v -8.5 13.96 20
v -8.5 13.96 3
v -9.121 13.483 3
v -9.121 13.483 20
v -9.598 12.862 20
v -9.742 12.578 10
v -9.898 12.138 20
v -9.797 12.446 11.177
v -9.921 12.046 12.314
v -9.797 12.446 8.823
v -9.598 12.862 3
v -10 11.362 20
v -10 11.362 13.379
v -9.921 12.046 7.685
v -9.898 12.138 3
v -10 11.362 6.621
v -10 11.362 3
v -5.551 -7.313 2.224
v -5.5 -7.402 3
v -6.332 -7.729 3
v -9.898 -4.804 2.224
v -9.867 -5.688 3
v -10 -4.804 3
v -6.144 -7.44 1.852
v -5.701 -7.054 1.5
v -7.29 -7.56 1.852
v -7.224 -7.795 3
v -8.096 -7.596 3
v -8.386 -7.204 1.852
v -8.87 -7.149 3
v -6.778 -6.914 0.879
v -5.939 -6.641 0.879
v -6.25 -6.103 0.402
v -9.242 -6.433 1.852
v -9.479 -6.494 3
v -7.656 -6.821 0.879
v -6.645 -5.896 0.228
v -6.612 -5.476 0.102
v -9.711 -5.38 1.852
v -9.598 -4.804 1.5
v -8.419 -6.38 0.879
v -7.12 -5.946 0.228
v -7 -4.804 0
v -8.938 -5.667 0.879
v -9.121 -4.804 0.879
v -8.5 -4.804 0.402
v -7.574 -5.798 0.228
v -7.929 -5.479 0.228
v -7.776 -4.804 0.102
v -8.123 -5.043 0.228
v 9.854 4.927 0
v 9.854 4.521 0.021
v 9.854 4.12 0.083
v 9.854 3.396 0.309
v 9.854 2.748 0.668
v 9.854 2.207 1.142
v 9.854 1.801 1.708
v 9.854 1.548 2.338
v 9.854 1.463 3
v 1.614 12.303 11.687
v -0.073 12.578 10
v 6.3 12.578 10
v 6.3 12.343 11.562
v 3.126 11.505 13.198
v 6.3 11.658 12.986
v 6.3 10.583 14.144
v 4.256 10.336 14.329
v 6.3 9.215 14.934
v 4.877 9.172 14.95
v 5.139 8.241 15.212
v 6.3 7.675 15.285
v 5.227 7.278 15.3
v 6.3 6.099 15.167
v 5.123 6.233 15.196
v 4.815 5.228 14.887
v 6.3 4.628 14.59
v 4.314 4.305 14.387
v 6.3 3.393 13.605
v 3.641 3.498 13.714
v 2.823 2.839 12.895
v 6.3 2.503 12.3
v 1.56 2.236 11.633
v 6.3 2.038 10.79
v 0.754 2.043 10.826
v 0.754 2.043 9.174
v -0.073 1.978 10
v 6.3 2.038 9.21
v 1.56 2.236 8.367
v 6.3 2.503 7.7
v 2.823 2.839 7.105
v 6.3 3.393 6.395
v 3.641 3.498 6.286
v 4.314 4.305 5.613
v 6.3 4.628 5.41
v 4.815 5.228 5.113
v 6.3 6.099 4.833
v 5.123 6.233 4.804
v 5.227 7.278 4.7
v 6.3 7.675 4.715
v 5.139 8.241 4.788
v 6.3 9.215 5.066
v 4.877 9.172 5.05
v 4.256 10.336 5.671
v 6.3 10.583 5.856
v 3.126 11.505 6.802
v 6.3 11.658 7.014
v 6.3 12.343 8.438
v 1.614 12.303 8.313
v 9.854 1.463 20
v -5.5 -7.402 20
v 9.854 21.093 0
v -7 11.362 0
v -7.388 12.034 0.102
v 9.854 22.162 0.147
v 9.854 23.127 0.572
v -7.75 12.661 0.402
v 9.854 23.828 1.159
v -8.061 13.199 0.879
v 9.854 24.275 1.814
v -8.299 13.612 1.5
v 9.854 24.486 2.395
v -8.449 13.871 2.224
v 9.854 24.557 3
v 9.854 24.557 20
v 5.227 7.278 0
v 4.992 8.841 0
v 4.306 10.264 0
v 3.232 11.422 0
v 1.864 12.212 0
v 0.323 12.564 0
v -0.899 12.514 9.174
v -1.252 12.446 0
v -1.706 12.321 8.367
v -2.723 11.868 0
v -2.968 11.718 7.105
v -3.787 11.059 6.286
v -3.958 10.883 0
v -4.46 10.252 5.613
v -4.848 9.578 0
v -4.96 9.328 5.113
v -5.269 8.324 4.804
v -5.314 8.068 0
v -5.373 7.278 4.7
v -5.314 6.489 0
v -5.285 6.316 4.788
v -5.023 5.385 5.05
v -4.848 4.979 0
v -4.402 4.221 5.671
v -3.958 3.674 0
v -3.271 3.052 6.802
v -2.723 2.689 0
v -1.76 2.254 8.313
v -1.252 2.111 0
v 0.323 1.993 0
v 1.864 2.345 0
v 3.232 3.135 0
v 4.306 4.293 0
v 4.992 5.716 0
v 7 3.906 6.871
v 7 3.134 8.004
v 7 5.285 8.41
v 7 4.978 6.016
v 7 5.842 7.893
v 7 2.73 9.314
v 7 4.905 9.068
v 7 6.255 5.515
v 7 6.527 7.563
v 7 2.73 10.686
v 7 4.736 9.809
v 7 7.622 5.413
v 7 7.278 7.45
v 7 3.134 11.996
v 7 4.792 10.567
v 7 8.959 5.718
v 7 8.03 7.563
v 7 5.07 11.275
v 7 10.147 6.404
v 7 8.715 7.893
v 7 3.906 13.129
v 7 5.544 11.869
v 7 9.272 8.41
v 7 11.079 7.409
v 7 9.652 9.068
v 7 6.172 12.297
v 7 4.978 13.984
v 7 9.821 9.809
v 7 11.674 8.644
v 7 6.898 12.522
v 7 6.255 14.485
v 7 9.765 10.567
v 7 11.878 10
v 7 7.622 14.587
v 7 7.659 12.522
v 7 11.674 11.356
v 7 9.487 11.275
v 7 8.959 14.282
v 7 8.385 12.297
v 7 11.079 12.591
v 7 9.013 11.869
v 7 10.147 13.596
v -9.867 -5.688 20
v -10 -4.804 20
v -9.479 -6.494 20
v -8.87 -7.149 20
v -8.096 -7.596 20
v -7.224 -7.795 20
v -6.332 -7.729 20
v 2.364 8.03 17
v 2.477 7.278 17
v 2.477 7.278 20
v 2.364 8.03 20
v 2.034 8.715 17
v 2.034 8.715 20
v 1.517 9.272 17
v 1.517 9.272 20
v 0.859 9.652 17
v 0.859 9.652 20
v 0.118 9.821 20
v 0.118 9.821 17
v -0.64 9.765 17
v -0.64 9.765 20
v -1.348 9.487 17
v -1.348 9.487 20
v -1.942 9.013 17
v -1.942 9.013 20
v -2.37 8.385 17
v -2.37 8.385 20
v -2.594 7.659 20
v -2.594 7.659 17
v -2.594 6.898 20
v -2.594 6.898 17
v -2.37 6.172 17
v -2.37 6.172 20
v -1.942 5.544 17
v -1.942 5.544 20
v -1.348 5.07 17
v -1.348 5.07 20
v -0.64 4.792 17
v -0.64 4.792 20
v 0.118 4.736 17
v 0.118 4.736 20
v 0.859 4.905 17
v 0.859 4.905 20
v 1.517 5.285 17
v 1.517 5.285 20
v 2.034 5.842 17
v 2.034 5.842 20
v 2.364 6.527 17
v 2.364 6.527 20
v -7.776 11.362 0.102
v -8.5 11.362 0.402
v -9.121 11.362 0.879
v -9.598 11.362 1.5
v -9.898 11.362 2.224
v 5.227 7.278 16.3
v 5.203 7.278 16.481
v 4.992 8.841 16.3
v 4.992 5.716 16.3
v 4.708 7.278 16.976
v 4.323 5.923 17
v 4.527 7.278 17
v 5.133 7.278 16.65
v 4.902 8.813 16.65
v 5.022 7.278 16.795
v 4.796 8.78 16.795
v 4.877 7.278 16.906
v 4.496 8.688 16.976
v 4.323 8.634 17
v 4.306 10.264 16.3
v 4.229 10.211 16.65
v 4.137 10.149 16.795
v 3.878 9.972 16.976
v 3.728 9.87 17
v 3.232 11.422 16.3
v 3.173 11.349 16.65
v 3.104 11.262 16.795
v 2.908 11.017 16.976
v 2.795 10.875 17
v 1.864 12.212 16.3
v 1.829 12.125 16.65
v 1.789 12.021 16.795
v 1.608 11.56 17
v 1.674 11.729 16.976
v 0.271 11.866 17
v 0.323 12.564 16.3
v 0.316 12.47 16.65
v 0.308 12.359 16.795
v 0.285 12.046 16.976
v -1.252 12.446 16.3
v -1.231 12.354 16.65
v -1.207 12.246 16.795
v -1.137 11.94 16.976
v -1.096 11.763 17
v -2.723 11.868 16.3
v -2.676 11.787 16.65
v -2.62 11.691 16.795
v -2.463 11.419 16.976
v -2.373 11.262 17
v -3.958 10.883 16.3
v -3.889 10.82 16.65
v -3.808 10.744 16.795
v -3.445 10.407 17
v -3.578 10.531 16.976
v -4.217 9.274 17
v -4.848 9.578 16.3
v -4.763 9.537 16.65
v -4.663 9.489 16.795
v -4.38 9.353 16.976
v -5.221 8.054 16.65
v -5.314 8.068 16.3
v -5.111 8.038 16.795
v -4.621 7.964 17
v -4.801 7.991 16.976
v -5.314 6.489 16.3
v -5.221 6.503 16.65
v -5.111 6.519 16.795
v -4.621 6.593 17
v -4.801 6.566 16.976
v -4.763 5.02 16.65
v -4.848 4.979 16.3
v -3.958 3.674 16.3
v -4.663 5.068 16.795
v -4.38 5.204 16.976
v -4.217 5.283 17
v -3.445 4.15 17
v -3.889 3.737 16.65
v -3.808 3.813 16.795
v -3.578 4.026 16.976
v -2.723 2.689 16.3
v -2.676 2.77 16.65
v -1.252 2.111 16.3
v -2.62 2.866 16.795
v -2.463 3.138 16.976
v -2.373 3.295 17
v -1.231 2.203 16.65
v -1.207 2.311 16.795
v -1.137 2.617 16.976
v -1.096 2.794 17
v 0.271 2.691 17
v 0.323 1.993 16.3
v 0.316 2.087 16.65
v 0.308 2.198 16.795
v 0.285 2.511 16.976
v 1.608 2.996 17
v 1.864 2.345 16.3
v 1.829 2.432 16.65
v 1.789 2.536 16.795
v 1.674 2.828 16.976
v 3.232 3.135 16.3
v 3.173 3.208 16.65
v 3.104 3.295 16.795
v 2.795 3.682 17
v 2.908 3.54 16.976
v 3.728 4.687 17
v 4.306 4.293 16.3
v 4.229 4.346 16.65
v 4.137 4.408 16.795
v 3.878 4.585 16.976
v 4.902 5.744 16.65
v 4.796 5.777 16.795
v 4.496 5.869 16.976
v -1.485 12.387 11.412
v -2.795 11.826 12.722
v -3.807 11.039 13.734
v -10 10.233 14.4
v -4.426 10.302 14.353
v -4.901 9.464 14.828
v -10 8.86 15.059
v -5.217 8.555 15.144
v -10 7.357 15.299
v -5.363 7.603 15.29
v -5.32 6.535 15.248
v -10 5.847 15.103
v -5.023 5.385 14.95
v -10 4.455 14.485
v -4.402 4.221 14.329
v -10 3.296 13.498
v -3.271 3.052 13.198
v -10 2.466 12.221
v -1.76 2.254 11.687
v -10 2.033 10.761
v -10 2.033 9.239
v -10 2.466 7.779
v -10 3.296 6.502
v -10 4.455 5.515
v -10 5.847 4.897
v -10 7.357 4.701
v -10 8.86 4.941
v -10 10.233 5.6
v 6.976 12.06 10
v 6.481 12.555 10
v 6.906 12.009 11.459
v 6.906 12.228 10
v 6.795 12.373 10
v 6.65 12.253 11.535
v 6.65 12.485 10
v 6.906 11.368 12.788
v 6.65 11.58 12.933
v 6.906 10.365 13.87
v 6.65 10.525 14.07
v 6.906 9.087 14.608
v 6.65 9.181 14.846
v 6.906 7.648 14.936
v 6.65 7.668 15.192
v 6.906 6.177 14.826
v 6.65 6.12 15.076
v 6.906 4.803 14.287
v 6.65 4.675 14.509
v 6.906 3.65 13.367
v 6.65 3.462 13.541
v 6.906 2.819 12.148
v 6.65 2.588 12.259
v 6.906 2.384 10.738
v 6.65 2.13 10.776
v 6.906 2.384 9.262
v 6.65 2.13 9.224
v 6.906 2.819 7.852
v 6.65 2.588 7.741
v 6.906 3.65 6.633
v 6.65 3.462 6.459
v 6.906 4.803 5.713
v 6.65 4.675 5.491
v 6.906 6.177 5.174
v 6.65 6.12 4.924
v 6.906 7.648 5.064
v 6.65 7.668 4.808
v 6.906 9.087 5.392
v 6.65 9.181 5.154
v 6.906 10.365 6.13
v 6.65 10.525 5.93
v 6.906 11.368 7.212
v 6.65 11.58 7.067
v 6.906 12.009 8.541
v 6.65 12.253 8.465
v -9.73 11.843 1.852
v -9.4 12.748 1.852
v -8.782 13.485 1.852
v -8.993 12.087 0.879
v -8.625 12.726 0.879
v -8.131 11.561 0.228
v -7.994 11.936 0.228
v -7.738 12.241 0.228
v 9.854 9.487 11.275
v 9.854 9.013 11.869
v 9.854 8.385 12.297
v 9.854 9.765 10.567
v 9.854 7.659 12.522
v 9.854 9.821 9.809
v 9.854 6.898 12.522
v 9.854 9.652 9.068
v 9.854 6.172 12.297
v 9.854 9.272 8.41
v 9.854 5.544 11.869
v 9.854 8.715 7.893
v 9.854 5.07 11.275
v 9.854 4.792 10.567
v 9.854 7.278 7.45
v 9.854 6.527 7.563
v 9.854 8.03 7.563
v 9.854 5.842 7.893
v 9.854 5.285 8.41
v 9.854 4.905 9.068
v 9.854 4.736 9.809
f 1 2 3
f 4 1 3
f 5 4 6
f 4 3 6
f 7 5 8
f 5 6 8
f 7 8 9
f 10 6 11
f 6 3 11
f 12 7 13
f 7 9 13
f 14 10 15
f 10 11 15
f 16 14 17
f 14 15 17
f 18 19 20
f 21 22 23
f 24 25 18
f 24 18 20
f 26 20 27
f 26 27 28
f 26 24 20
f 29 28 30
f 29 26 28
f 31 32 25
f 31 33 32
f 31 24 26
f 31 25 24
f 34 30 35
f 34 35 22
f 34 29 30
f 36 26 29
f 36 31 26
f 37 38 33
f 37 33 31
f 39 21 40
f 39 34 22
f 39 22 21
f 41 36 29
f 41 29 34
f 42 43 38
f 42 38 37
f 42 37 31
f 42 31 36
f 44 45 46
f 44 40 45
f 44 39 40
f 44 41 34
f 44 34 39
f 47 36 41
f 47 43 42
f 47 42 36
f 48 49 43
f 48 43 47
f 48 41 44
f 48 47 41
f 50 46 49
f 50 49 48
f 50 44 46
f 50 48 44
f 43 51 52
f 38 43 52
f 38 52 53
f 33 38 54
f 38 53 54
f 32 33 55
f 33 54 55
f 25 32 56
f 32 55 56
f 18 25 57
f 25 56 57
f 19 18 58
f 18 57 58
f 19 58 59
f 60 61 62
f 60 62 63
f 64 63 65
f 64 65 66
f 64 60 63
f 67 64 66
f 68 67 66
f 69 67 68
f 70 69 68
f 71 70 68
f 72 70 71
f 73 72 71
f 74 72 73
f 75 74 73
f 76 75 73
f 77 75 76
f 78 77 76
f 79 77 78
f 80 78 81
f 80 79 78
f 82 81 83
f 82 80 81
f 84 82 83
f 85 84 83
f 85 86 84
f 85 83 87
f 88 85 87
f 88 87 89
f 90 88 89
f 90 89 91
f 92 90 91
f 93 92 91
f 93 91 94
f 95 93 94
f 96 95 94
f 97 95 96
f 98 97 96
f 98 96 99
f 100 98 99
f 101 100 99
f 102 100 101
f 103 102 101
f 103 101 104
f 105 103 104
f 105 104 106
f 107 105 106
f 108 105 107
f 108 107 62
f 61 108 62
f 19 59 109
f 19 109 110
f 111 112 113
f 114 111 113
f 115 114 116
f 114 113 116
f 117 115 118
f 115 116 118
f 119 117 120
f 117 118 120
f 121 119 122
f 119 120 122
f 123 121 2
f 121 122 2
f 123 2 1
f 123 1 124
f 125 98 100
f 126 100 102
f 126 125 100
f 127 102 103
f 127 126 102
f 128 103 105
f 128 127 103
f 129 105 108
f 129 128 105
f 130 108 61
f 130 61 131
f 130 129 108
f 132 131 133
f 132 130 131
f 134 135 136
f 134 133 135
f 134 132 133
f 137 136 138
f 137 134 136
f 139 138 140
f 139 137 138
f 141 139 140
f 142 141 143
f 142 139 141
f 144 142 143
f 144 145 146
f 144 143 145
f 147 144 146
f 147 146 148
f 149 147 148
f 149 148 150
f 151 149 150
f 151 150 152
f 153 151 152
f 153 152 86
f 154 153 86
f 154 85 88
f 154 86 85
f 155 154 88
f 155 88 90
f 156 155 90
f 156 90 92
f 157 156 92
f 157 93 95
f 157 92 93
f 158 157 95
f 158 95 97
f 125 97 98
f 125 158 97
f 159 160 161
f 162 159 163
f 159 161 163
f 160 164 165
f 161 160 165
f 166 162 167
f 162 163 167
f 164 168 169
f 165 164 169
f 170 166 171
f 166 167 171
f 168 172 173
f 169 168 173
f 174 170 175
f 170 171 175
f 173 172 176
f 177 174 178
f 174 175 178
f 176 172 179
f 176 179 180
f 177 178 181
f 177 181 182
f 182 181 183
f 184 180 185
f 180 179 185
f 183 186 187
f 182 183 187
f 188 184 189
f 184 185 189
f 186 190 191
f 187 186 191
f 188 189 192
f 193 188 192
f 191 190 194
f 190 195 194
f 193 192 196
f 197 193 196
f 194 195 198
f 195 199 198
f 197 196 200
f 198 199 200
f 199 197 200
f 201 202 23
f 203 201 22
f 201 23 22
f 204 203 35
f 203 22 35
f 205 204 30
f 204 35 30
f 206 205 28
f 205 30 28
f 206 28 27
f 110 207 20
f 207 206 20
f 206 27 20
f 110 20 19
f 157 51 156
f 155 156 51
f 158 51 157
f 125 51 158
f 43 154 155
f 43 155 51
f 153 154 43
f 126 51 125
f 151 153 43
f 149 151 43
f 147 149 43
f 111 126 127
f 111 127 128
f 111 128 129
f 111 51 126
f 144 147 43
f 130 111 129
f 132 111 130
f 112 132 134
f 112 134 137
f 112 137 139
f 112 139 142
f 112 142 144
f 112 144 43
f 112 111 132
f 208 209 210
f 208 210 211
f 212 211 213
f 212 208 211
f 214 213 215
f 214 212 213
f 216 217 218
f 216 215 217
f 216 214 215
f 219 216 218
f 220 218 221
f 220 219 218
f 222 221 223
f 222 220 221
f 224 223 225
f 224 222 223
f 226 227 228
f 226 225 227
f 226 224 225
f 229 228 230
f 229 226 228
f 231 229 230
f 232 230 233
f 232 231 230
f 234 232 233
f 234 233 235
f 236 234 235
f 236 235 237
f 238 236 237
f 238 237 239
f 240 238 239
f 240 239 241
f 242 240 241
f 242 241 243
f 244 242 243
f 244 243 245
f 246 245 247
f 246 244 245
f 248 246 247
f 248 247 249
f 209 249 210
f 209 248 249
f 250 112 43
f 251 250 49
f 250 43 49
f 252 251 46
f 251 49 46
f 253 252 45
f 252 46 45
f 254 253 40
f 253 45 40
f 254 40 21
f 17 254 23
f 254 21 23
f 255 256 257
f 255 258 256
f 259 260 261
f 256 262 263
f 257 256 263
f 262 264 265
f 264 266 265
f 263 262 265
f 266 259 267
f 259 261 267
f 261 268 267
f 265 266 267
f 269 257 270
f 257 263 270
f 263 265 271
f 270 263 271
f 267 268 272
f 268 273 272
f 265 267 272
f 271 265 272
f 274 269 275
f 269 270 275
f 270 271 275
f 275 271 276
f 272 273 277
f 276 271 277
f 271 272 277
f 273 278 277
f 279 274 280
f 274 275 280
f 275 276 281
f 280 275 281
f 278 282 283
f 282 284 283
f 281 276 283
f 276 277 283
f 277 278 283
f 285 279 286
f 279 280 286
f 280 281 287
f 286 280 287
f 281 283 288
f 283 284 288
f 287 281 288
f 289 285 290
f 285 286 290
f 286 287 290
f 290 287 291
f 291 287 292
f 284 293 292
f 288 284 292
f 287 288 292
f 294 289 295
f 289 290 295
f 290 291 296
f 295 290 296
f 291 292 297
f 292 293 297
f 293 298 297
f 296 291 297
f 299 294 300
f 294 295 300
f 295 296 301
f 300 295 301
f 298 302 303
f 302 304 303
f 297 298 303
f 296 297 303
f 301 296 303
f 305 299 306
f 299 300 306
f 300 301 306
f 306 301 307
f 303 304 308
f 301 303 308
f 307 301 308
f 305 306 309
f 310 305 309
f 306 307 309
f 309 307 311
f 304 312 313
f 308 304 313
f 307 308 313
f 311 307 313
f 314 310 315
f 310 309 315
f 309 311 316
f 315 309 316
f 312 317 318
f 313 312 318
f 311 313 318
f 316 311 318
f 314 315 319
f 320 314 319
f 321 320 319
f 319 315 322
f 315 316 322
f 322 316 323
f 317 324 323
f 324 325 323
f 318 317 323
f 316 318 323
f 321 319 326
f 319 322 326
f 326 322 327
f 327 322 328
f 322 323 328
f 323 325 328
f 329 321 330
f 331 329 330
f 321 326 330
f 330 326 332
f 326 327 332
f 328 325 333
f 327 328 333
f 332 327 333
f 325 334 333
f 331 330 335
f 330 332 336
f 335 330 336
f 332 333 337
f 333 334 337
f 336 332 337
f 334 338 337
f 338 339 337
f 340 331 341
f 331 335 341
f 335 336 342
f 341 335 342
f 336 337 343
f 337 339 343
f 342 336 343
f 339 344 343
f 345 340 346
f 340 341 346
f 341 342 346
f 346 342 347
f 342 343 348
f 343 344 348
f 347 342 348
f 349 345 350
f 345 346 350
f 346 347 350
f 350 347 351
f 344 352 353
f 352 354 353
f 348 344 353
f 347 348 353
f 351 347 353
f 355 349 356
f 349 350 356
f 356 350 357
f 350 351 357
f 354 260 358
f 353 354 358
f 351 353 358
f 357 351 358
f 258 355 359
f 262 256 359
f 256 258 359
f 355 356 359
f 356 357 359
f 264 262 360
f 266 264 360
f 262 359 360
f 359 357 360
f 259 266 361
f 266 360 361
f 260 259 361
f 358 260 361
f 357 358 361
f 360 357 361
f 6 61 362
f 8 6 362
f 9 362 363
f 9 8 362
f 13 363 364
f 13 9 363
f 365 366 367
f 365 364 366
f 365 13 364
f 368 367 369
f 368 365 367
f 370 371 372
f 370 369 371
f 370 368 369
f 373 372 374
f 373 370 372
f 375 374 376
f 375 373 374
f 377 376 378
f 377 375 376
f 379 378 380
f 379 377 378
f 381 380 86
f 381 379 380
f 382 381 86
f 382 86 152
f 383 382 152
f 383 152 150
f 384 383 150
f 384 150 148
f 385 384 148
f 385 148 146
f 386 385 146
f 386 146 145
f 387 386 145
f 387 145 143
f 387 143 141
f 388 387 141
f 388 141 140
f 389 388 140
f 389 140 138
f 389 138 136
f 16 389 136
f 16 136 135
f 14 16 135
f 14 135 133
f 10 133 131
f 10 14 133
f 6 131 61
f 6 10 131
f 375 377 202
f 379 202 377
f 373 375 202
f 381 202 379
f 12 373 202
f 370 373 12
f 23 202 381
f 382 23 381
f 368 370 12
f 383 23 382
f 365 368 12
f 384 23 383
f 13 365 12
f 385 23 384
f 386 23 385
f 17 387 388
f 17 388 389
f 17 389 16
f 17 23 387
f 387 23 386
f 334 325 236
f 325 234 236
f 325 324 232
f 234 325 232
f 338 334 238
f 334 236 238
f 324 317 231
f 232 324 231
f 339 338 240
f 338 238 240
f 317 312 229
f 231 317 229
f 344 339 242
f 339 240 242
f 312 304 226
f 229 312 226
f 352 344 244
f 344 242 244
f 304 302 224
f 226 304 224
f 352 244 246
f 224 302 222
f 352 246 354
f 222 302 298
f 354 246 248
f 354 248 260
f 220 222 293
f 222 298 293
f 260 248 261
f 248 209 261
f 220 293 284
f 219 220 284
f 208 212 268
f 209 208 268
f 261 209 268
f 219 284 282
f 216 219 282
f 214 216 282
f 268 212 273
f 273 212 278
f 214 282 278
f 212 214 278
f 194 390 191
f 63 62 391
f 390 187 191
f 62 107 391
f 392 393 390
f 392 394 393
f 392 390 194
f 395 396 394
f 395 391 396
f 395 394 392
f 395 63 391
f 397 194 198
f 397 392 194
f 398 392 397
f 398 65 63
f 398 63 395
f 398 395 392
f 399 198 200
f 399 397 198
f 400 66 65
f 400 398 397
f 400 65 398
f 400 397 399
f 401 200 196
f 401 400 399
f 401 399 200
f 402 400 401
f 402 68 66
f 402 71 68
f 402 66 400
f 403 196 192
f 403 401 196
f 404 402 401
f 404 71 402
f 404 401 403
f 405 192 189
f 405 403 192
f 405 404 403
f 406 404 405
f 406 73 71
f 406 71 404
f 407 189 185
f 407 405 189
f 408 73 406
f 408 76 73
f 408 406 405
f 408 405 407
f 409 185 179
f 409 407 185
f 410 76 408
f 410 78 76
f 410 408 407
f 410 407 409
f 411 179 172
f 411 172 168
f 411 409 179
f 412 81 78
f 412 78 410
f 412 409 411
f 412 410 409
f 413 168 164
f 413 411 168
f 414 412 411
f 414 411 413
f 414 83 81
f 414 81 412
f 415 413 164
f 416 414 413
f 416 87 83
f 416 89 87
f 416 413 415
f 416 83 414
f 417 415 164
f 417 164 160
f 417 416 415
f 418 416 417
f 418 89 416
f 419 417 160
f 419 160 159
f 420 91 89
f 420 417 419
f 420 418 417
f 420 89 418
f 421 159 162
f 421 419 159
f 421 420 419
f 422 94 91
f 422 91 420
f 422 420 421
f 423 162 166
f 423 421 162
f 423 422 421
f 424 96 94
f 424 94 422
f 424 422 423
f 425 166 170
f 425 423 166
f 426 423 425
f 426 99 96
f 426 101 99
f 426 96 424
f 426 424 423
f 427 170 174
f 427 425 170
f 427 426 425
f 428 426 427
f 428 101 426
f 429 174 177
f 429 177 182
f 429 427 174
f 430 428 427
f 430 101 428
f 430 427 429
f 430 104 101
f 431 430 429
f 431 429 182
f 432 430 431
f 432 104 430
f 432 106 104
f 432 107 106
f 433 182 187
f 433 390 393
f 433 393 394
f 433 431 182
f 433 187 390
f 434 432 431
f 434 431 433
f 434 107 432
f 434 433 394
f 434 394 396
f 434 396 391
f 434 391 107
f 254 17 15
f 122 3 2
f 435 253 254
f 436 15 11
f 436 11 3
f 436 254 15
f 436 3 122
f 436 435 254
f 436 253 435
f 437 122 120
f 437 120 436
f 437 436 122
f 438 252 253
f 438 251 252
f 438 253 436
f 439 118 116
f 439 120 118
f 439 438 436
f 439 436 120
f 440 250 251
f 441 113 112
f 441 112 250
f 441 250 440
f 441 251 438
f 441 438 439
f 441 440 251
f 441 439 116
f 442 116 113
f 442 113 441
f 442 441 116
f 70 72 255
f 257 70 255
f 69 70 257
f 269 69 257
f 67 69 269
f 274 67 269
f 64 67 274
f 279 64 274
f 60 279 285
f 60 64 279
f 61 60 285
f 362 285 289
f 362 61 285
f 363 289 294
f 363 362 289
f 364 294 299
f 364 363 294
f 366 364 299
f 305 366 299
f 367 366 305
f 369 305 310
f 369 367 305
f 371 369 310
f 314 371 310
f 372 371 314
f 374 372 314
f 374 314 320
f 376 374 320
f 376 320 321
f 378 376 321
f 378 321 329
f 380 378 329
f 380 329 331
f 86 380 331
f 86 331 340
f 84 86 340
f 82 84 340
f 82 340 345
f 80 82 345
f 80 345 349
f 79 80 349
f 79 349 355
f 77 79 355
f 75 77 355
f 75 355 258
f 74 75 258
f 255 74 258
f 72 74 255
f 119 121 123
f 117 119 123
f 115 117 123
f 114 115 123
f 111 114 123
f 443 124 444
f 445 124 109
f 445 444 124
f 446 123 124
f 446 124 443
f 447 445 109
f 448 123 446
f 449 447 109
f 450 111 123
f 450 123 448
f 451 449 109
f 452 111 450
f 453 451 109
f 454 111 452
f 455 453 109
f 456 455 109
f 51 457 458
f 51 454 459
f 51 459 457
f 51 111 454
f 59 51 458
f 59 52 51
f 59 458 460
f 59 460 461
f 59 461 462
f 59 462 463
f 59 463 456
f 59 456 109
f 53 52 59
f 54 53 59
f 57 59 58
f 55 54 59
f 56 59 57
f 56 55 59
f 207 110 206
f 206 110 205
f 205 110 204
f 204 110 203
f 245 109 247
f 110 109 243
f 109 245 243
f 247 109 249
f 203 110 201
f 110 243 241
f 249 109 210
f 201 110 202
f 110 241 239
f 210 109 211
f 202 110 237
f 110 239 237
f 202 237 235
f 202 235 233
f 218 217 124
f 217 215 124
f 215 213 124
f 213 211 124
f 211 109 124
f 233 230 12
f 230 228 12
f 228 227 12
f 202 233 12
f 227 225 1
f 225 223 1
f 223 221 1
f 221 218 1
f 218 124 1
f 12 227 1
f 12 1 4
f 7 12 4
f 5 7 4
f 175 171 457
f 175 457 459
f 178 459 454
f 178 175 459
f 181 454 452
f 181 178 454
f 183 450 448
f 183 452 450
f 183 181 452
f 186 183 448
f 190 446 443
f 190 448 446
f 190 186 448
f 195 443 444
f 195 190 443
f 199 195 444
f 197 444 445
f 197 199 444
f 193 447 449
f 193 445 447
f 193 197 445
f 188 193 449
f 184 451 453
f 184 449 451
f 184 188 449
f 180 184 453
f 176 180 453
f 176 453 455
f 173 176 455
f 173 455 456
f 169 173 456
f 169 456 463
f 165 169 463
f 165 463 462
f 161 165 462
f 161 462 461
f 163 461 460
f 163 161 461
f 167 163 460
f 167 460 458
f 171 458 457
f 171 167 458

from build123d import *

# Parameters (mm, degrees)
BOSS_EXTRUDE1_DEPTH     = 20
SKETCH4_R               = 2.55
CUT_EXTRUDE2_DEPTH      = 34.212108316
CUT_EXTRUDE3_DEPTH      = 34.212108316
CUT_EXTRUDE3_DEPTH_BACK = 34.212108316
SKETCH5_R               = 2.55
SKETCH6_R               = 5.3
CUT_EXTRUDE4_DEPTH      = 17
CUT_EXTRUDE5_DEPTH      = 7
CUT_EXTRUDE5_DEPTH_BACK = 10
SKETCH7_R               = 5.3
FILLET1_R               = 0.7
FILLET2_R               = 3


with BuildPart() as part:
    # Sketch1 → Boss-Extrude1 (new body)
    with BuildSketch(Plane.XY):
        Polygon((-10, 13.094), (9.854423989, 24.556957035), (9.854423989, 1.462957035), (-10, -10), align=None)
    extrude(amount=BOSS_EXTRUDE1_DEPTH)

    # Sketch4 → Cut-Extrude2 (cut, through all)
    with BuildSketch(Plane.XY):
        with Locations((-0.072788005, 7.278478517)):
            Circle(SKETCH4_R)
    extrude(amount=CUT_EXTRUDE2_DEPTH, mode=Mode.SUBTRACT)

    # Sketch5 → Cut-Extrude3 (cut, two sides: drawn at the far end of the back side and taken through both)
    with BuildSketch(Plane(origin=(0, 0, 0), x_dir=(0, 0, -1), z_dir=(1, 0, 0)).offset(-CUT_EXTRUDE3_DEPTH_BACK)):
        with Locations((-10, 7.278478517)):
            Circle(SKETCH5_R)
    extrude(amount=CUT_EXTRUDE3_DEPTH + CUT_EXTRUDE3_DEPTH_BACK, mode=Mode.SUBTRACT)

    # Sketch6 → Cut-Extrude4 (cut)
    with BuildSketch(Plane.XY):
        with Locations((-0.072788005, 7.278478517)):
            Circle(SKETCH6_R)
    extrude(amount=CUT_EXTRUDE4_DEPTH, mode=Mode.SUBTRACT)

    # Sketch7 → Cut-Extrude5 (cut, two sides: drawn at the far end of the back side and taken through both)
    with BuildSketch(Plane(origin=(0, 0, 0), x_dir=(0, 0, -1), z_dir=(1, 0, 0)).offset(-CUT_EXTRUDE5_DEPTH_BACK)):
        with Locations(Location((-10, 7.278478517, 0), (0, 0, 90))):
            Circle(SKETCH7_R)
    extrude(amount=CUT_EXTRUDE5_DEPTH + CUT_EXTRUDE5_DEPTH_BACK, mode=Mode.SUBTRACT)

    # Fillet1
    fillet1_edges = [part.edges().sort_by_distance(p)[0] for p in [
        (-5.372788005, 7.278478517, 17),
        (7, 1.978478517, 10),
    ]]
    fillet(fillet1_edges, radius=FILLET1_R)

    # Fillet2
    # the kernel refuses this fillet: 3 mm, written as the material it takes off along each edge
    with BuildSketch(Plane(origin=(-7, -4.803847577, 3), x_dir=(-1, 0, 0), z_dir=(0, 0, -1))) as fillet2_piece_1_section:
        Polygon((0, 0), (FILLET2_R, 0), (FILLET2_R, -FILLET2_R * 1.73205080757), (-FILLET2_R * 0.5, -FILLET2_R * 0.866025403784), align=None)
    fillet2_piece_1 = extrude(amount=FILLET2_R, mode=Mode.PRIVATE)
    fillet2_piece_1 = fillet2_piece_1 - Plane(origin=(-7, -4.803847577, 3), x_dir=(0.49999999999999906, 0.8660254037844392, 0), z_dir=(0, 0, -1)) * Sphere(FILLET2_R, mode=Mode.PRIVATE)
    add(fillet2_piece_1, mode=Mode.SUBTRACT)
    with BuildSketch(Plane(origin=(-7, 11.361949192, 3), x_dir=(-0.5000000000000018, 0.8660254037844377, 0), z_dir=(0, 0, -1))) as fillet2_piece_2_section:
        Polygon((0, 0), (FILLET2_R, 0), (FILLET2_R, -FILLET2_R * 0.57735026919), (FILLET2_R * 0.5, -FILLET2_R * 0.866025403784), align=None)
    fillet2_piece_2 = extrude(amount=FILLET2_R, mode=Mode.PRIVATE)
    fillet2_piece_2 = fillet2_piece_2 - Plane(origin=(-7, 11.361949192, 3), x_dir=(0.8660254037844393, -0.49999999999999883, 0), z_dir=(0, 0, -1)) * Sphere(FILLET2_R, mode=Mode.PRIVATE)
    add(fillet2_piece_2, mode=Mode.SUBTRACT)
    with BuildSketch(Plane(origin=(-10, -4.803847577, 0), x_dir=(0, 0, 1), z_dir=(0, 1, 0))) as fillet2_piece_3:
        with BuildLine():
            CenterArc((FILLET2_R, FILLET2_R), FILLET2_R, 180, 90)
            Line((0, FILLET2_R), (0, 0))
            Line((0, 0), (FILLET2_R, 0))
        make_face()
    extrude(amount=16.16579677, mode=Mode.SUBTRACT)
    with BuildSketch(Plane(origin=(-8.5, 13.960025404, 0), x_dir=(0, 0, 1), z_dir=(0.8660254037844377, 0.5000000000000018, 0))) as fillet2_piece_4:
        with BuildLine():
            CenterArc((FILLET2_R, FILLET2_R), FILLET2_R, 180, 90)
            Line((0, FILLET2_R), (0, 0))
            Line((0, 0), (FILLET2_R, 0))
        make_face()
    extrude(amount=28.693863262, mode=Mode.SUBTRACT)
    with BuildSketch(Plane(origin=(16.349614518, 5.212957035, 0), x_dir=(0, 0, 1), z_dir=(-0.866025403784438, -0.5000000000000012, 0))) as fillet2_piece_5:
        with BuildLine():
            CenterArc((FILLET2_R, FILLET2_R), FILLET2_R, 180, 90)
            Line((0, FILLET2_R), (0, 0))
            Line((0, 0), (FILLET2_R, 0))
        make_face()
    extrude(amount=25.229761647, mode=Mode.SUBTRACT)
    with BuildSketch(Plane(origin=(-10, -10, 3), x_dir=(0, 1, 0), z_dir=(0, 0, 1))) as fillet2_piece_6:
        with BuildLine():
            CenterArc((FILLET2_R * 1.73205080757, -FILLET2_R), FILLET2_R, 90, 120)
            Line((FILLET2_R * 0.866025403784, -FILLET2_R * 1.5), (0, 0))
            Line((0, 0), (FILLET2_R * 1.73205080757, 0))
        make_face()
    extrude(amount=29.990381057, mode=Mode.SUBTRACT)
    with BuildSketch(Plane(origin=(-10, 13.094, 3), x_dir=(0.8660254037844375, 0.5000000000000019, 0), z_dir=(0, 0, 1))) as fillet2_piece_7:
        with BuildLine():
            CenterArc((FILLET2_R * 0.57735026919, -FILLET2_R), FILLET2_R, 90, 60)
            Line((-FILLET2_R * 0.288675134595, -FILLET2_R * 0.5), (0, 0))
            Line((0, 0), (FILLET2_R * 0.57735026919, 0))
        make_face()
    extrude(amount=21.330127019, mode=Mode.SUBTRACT)


solid = part.part
